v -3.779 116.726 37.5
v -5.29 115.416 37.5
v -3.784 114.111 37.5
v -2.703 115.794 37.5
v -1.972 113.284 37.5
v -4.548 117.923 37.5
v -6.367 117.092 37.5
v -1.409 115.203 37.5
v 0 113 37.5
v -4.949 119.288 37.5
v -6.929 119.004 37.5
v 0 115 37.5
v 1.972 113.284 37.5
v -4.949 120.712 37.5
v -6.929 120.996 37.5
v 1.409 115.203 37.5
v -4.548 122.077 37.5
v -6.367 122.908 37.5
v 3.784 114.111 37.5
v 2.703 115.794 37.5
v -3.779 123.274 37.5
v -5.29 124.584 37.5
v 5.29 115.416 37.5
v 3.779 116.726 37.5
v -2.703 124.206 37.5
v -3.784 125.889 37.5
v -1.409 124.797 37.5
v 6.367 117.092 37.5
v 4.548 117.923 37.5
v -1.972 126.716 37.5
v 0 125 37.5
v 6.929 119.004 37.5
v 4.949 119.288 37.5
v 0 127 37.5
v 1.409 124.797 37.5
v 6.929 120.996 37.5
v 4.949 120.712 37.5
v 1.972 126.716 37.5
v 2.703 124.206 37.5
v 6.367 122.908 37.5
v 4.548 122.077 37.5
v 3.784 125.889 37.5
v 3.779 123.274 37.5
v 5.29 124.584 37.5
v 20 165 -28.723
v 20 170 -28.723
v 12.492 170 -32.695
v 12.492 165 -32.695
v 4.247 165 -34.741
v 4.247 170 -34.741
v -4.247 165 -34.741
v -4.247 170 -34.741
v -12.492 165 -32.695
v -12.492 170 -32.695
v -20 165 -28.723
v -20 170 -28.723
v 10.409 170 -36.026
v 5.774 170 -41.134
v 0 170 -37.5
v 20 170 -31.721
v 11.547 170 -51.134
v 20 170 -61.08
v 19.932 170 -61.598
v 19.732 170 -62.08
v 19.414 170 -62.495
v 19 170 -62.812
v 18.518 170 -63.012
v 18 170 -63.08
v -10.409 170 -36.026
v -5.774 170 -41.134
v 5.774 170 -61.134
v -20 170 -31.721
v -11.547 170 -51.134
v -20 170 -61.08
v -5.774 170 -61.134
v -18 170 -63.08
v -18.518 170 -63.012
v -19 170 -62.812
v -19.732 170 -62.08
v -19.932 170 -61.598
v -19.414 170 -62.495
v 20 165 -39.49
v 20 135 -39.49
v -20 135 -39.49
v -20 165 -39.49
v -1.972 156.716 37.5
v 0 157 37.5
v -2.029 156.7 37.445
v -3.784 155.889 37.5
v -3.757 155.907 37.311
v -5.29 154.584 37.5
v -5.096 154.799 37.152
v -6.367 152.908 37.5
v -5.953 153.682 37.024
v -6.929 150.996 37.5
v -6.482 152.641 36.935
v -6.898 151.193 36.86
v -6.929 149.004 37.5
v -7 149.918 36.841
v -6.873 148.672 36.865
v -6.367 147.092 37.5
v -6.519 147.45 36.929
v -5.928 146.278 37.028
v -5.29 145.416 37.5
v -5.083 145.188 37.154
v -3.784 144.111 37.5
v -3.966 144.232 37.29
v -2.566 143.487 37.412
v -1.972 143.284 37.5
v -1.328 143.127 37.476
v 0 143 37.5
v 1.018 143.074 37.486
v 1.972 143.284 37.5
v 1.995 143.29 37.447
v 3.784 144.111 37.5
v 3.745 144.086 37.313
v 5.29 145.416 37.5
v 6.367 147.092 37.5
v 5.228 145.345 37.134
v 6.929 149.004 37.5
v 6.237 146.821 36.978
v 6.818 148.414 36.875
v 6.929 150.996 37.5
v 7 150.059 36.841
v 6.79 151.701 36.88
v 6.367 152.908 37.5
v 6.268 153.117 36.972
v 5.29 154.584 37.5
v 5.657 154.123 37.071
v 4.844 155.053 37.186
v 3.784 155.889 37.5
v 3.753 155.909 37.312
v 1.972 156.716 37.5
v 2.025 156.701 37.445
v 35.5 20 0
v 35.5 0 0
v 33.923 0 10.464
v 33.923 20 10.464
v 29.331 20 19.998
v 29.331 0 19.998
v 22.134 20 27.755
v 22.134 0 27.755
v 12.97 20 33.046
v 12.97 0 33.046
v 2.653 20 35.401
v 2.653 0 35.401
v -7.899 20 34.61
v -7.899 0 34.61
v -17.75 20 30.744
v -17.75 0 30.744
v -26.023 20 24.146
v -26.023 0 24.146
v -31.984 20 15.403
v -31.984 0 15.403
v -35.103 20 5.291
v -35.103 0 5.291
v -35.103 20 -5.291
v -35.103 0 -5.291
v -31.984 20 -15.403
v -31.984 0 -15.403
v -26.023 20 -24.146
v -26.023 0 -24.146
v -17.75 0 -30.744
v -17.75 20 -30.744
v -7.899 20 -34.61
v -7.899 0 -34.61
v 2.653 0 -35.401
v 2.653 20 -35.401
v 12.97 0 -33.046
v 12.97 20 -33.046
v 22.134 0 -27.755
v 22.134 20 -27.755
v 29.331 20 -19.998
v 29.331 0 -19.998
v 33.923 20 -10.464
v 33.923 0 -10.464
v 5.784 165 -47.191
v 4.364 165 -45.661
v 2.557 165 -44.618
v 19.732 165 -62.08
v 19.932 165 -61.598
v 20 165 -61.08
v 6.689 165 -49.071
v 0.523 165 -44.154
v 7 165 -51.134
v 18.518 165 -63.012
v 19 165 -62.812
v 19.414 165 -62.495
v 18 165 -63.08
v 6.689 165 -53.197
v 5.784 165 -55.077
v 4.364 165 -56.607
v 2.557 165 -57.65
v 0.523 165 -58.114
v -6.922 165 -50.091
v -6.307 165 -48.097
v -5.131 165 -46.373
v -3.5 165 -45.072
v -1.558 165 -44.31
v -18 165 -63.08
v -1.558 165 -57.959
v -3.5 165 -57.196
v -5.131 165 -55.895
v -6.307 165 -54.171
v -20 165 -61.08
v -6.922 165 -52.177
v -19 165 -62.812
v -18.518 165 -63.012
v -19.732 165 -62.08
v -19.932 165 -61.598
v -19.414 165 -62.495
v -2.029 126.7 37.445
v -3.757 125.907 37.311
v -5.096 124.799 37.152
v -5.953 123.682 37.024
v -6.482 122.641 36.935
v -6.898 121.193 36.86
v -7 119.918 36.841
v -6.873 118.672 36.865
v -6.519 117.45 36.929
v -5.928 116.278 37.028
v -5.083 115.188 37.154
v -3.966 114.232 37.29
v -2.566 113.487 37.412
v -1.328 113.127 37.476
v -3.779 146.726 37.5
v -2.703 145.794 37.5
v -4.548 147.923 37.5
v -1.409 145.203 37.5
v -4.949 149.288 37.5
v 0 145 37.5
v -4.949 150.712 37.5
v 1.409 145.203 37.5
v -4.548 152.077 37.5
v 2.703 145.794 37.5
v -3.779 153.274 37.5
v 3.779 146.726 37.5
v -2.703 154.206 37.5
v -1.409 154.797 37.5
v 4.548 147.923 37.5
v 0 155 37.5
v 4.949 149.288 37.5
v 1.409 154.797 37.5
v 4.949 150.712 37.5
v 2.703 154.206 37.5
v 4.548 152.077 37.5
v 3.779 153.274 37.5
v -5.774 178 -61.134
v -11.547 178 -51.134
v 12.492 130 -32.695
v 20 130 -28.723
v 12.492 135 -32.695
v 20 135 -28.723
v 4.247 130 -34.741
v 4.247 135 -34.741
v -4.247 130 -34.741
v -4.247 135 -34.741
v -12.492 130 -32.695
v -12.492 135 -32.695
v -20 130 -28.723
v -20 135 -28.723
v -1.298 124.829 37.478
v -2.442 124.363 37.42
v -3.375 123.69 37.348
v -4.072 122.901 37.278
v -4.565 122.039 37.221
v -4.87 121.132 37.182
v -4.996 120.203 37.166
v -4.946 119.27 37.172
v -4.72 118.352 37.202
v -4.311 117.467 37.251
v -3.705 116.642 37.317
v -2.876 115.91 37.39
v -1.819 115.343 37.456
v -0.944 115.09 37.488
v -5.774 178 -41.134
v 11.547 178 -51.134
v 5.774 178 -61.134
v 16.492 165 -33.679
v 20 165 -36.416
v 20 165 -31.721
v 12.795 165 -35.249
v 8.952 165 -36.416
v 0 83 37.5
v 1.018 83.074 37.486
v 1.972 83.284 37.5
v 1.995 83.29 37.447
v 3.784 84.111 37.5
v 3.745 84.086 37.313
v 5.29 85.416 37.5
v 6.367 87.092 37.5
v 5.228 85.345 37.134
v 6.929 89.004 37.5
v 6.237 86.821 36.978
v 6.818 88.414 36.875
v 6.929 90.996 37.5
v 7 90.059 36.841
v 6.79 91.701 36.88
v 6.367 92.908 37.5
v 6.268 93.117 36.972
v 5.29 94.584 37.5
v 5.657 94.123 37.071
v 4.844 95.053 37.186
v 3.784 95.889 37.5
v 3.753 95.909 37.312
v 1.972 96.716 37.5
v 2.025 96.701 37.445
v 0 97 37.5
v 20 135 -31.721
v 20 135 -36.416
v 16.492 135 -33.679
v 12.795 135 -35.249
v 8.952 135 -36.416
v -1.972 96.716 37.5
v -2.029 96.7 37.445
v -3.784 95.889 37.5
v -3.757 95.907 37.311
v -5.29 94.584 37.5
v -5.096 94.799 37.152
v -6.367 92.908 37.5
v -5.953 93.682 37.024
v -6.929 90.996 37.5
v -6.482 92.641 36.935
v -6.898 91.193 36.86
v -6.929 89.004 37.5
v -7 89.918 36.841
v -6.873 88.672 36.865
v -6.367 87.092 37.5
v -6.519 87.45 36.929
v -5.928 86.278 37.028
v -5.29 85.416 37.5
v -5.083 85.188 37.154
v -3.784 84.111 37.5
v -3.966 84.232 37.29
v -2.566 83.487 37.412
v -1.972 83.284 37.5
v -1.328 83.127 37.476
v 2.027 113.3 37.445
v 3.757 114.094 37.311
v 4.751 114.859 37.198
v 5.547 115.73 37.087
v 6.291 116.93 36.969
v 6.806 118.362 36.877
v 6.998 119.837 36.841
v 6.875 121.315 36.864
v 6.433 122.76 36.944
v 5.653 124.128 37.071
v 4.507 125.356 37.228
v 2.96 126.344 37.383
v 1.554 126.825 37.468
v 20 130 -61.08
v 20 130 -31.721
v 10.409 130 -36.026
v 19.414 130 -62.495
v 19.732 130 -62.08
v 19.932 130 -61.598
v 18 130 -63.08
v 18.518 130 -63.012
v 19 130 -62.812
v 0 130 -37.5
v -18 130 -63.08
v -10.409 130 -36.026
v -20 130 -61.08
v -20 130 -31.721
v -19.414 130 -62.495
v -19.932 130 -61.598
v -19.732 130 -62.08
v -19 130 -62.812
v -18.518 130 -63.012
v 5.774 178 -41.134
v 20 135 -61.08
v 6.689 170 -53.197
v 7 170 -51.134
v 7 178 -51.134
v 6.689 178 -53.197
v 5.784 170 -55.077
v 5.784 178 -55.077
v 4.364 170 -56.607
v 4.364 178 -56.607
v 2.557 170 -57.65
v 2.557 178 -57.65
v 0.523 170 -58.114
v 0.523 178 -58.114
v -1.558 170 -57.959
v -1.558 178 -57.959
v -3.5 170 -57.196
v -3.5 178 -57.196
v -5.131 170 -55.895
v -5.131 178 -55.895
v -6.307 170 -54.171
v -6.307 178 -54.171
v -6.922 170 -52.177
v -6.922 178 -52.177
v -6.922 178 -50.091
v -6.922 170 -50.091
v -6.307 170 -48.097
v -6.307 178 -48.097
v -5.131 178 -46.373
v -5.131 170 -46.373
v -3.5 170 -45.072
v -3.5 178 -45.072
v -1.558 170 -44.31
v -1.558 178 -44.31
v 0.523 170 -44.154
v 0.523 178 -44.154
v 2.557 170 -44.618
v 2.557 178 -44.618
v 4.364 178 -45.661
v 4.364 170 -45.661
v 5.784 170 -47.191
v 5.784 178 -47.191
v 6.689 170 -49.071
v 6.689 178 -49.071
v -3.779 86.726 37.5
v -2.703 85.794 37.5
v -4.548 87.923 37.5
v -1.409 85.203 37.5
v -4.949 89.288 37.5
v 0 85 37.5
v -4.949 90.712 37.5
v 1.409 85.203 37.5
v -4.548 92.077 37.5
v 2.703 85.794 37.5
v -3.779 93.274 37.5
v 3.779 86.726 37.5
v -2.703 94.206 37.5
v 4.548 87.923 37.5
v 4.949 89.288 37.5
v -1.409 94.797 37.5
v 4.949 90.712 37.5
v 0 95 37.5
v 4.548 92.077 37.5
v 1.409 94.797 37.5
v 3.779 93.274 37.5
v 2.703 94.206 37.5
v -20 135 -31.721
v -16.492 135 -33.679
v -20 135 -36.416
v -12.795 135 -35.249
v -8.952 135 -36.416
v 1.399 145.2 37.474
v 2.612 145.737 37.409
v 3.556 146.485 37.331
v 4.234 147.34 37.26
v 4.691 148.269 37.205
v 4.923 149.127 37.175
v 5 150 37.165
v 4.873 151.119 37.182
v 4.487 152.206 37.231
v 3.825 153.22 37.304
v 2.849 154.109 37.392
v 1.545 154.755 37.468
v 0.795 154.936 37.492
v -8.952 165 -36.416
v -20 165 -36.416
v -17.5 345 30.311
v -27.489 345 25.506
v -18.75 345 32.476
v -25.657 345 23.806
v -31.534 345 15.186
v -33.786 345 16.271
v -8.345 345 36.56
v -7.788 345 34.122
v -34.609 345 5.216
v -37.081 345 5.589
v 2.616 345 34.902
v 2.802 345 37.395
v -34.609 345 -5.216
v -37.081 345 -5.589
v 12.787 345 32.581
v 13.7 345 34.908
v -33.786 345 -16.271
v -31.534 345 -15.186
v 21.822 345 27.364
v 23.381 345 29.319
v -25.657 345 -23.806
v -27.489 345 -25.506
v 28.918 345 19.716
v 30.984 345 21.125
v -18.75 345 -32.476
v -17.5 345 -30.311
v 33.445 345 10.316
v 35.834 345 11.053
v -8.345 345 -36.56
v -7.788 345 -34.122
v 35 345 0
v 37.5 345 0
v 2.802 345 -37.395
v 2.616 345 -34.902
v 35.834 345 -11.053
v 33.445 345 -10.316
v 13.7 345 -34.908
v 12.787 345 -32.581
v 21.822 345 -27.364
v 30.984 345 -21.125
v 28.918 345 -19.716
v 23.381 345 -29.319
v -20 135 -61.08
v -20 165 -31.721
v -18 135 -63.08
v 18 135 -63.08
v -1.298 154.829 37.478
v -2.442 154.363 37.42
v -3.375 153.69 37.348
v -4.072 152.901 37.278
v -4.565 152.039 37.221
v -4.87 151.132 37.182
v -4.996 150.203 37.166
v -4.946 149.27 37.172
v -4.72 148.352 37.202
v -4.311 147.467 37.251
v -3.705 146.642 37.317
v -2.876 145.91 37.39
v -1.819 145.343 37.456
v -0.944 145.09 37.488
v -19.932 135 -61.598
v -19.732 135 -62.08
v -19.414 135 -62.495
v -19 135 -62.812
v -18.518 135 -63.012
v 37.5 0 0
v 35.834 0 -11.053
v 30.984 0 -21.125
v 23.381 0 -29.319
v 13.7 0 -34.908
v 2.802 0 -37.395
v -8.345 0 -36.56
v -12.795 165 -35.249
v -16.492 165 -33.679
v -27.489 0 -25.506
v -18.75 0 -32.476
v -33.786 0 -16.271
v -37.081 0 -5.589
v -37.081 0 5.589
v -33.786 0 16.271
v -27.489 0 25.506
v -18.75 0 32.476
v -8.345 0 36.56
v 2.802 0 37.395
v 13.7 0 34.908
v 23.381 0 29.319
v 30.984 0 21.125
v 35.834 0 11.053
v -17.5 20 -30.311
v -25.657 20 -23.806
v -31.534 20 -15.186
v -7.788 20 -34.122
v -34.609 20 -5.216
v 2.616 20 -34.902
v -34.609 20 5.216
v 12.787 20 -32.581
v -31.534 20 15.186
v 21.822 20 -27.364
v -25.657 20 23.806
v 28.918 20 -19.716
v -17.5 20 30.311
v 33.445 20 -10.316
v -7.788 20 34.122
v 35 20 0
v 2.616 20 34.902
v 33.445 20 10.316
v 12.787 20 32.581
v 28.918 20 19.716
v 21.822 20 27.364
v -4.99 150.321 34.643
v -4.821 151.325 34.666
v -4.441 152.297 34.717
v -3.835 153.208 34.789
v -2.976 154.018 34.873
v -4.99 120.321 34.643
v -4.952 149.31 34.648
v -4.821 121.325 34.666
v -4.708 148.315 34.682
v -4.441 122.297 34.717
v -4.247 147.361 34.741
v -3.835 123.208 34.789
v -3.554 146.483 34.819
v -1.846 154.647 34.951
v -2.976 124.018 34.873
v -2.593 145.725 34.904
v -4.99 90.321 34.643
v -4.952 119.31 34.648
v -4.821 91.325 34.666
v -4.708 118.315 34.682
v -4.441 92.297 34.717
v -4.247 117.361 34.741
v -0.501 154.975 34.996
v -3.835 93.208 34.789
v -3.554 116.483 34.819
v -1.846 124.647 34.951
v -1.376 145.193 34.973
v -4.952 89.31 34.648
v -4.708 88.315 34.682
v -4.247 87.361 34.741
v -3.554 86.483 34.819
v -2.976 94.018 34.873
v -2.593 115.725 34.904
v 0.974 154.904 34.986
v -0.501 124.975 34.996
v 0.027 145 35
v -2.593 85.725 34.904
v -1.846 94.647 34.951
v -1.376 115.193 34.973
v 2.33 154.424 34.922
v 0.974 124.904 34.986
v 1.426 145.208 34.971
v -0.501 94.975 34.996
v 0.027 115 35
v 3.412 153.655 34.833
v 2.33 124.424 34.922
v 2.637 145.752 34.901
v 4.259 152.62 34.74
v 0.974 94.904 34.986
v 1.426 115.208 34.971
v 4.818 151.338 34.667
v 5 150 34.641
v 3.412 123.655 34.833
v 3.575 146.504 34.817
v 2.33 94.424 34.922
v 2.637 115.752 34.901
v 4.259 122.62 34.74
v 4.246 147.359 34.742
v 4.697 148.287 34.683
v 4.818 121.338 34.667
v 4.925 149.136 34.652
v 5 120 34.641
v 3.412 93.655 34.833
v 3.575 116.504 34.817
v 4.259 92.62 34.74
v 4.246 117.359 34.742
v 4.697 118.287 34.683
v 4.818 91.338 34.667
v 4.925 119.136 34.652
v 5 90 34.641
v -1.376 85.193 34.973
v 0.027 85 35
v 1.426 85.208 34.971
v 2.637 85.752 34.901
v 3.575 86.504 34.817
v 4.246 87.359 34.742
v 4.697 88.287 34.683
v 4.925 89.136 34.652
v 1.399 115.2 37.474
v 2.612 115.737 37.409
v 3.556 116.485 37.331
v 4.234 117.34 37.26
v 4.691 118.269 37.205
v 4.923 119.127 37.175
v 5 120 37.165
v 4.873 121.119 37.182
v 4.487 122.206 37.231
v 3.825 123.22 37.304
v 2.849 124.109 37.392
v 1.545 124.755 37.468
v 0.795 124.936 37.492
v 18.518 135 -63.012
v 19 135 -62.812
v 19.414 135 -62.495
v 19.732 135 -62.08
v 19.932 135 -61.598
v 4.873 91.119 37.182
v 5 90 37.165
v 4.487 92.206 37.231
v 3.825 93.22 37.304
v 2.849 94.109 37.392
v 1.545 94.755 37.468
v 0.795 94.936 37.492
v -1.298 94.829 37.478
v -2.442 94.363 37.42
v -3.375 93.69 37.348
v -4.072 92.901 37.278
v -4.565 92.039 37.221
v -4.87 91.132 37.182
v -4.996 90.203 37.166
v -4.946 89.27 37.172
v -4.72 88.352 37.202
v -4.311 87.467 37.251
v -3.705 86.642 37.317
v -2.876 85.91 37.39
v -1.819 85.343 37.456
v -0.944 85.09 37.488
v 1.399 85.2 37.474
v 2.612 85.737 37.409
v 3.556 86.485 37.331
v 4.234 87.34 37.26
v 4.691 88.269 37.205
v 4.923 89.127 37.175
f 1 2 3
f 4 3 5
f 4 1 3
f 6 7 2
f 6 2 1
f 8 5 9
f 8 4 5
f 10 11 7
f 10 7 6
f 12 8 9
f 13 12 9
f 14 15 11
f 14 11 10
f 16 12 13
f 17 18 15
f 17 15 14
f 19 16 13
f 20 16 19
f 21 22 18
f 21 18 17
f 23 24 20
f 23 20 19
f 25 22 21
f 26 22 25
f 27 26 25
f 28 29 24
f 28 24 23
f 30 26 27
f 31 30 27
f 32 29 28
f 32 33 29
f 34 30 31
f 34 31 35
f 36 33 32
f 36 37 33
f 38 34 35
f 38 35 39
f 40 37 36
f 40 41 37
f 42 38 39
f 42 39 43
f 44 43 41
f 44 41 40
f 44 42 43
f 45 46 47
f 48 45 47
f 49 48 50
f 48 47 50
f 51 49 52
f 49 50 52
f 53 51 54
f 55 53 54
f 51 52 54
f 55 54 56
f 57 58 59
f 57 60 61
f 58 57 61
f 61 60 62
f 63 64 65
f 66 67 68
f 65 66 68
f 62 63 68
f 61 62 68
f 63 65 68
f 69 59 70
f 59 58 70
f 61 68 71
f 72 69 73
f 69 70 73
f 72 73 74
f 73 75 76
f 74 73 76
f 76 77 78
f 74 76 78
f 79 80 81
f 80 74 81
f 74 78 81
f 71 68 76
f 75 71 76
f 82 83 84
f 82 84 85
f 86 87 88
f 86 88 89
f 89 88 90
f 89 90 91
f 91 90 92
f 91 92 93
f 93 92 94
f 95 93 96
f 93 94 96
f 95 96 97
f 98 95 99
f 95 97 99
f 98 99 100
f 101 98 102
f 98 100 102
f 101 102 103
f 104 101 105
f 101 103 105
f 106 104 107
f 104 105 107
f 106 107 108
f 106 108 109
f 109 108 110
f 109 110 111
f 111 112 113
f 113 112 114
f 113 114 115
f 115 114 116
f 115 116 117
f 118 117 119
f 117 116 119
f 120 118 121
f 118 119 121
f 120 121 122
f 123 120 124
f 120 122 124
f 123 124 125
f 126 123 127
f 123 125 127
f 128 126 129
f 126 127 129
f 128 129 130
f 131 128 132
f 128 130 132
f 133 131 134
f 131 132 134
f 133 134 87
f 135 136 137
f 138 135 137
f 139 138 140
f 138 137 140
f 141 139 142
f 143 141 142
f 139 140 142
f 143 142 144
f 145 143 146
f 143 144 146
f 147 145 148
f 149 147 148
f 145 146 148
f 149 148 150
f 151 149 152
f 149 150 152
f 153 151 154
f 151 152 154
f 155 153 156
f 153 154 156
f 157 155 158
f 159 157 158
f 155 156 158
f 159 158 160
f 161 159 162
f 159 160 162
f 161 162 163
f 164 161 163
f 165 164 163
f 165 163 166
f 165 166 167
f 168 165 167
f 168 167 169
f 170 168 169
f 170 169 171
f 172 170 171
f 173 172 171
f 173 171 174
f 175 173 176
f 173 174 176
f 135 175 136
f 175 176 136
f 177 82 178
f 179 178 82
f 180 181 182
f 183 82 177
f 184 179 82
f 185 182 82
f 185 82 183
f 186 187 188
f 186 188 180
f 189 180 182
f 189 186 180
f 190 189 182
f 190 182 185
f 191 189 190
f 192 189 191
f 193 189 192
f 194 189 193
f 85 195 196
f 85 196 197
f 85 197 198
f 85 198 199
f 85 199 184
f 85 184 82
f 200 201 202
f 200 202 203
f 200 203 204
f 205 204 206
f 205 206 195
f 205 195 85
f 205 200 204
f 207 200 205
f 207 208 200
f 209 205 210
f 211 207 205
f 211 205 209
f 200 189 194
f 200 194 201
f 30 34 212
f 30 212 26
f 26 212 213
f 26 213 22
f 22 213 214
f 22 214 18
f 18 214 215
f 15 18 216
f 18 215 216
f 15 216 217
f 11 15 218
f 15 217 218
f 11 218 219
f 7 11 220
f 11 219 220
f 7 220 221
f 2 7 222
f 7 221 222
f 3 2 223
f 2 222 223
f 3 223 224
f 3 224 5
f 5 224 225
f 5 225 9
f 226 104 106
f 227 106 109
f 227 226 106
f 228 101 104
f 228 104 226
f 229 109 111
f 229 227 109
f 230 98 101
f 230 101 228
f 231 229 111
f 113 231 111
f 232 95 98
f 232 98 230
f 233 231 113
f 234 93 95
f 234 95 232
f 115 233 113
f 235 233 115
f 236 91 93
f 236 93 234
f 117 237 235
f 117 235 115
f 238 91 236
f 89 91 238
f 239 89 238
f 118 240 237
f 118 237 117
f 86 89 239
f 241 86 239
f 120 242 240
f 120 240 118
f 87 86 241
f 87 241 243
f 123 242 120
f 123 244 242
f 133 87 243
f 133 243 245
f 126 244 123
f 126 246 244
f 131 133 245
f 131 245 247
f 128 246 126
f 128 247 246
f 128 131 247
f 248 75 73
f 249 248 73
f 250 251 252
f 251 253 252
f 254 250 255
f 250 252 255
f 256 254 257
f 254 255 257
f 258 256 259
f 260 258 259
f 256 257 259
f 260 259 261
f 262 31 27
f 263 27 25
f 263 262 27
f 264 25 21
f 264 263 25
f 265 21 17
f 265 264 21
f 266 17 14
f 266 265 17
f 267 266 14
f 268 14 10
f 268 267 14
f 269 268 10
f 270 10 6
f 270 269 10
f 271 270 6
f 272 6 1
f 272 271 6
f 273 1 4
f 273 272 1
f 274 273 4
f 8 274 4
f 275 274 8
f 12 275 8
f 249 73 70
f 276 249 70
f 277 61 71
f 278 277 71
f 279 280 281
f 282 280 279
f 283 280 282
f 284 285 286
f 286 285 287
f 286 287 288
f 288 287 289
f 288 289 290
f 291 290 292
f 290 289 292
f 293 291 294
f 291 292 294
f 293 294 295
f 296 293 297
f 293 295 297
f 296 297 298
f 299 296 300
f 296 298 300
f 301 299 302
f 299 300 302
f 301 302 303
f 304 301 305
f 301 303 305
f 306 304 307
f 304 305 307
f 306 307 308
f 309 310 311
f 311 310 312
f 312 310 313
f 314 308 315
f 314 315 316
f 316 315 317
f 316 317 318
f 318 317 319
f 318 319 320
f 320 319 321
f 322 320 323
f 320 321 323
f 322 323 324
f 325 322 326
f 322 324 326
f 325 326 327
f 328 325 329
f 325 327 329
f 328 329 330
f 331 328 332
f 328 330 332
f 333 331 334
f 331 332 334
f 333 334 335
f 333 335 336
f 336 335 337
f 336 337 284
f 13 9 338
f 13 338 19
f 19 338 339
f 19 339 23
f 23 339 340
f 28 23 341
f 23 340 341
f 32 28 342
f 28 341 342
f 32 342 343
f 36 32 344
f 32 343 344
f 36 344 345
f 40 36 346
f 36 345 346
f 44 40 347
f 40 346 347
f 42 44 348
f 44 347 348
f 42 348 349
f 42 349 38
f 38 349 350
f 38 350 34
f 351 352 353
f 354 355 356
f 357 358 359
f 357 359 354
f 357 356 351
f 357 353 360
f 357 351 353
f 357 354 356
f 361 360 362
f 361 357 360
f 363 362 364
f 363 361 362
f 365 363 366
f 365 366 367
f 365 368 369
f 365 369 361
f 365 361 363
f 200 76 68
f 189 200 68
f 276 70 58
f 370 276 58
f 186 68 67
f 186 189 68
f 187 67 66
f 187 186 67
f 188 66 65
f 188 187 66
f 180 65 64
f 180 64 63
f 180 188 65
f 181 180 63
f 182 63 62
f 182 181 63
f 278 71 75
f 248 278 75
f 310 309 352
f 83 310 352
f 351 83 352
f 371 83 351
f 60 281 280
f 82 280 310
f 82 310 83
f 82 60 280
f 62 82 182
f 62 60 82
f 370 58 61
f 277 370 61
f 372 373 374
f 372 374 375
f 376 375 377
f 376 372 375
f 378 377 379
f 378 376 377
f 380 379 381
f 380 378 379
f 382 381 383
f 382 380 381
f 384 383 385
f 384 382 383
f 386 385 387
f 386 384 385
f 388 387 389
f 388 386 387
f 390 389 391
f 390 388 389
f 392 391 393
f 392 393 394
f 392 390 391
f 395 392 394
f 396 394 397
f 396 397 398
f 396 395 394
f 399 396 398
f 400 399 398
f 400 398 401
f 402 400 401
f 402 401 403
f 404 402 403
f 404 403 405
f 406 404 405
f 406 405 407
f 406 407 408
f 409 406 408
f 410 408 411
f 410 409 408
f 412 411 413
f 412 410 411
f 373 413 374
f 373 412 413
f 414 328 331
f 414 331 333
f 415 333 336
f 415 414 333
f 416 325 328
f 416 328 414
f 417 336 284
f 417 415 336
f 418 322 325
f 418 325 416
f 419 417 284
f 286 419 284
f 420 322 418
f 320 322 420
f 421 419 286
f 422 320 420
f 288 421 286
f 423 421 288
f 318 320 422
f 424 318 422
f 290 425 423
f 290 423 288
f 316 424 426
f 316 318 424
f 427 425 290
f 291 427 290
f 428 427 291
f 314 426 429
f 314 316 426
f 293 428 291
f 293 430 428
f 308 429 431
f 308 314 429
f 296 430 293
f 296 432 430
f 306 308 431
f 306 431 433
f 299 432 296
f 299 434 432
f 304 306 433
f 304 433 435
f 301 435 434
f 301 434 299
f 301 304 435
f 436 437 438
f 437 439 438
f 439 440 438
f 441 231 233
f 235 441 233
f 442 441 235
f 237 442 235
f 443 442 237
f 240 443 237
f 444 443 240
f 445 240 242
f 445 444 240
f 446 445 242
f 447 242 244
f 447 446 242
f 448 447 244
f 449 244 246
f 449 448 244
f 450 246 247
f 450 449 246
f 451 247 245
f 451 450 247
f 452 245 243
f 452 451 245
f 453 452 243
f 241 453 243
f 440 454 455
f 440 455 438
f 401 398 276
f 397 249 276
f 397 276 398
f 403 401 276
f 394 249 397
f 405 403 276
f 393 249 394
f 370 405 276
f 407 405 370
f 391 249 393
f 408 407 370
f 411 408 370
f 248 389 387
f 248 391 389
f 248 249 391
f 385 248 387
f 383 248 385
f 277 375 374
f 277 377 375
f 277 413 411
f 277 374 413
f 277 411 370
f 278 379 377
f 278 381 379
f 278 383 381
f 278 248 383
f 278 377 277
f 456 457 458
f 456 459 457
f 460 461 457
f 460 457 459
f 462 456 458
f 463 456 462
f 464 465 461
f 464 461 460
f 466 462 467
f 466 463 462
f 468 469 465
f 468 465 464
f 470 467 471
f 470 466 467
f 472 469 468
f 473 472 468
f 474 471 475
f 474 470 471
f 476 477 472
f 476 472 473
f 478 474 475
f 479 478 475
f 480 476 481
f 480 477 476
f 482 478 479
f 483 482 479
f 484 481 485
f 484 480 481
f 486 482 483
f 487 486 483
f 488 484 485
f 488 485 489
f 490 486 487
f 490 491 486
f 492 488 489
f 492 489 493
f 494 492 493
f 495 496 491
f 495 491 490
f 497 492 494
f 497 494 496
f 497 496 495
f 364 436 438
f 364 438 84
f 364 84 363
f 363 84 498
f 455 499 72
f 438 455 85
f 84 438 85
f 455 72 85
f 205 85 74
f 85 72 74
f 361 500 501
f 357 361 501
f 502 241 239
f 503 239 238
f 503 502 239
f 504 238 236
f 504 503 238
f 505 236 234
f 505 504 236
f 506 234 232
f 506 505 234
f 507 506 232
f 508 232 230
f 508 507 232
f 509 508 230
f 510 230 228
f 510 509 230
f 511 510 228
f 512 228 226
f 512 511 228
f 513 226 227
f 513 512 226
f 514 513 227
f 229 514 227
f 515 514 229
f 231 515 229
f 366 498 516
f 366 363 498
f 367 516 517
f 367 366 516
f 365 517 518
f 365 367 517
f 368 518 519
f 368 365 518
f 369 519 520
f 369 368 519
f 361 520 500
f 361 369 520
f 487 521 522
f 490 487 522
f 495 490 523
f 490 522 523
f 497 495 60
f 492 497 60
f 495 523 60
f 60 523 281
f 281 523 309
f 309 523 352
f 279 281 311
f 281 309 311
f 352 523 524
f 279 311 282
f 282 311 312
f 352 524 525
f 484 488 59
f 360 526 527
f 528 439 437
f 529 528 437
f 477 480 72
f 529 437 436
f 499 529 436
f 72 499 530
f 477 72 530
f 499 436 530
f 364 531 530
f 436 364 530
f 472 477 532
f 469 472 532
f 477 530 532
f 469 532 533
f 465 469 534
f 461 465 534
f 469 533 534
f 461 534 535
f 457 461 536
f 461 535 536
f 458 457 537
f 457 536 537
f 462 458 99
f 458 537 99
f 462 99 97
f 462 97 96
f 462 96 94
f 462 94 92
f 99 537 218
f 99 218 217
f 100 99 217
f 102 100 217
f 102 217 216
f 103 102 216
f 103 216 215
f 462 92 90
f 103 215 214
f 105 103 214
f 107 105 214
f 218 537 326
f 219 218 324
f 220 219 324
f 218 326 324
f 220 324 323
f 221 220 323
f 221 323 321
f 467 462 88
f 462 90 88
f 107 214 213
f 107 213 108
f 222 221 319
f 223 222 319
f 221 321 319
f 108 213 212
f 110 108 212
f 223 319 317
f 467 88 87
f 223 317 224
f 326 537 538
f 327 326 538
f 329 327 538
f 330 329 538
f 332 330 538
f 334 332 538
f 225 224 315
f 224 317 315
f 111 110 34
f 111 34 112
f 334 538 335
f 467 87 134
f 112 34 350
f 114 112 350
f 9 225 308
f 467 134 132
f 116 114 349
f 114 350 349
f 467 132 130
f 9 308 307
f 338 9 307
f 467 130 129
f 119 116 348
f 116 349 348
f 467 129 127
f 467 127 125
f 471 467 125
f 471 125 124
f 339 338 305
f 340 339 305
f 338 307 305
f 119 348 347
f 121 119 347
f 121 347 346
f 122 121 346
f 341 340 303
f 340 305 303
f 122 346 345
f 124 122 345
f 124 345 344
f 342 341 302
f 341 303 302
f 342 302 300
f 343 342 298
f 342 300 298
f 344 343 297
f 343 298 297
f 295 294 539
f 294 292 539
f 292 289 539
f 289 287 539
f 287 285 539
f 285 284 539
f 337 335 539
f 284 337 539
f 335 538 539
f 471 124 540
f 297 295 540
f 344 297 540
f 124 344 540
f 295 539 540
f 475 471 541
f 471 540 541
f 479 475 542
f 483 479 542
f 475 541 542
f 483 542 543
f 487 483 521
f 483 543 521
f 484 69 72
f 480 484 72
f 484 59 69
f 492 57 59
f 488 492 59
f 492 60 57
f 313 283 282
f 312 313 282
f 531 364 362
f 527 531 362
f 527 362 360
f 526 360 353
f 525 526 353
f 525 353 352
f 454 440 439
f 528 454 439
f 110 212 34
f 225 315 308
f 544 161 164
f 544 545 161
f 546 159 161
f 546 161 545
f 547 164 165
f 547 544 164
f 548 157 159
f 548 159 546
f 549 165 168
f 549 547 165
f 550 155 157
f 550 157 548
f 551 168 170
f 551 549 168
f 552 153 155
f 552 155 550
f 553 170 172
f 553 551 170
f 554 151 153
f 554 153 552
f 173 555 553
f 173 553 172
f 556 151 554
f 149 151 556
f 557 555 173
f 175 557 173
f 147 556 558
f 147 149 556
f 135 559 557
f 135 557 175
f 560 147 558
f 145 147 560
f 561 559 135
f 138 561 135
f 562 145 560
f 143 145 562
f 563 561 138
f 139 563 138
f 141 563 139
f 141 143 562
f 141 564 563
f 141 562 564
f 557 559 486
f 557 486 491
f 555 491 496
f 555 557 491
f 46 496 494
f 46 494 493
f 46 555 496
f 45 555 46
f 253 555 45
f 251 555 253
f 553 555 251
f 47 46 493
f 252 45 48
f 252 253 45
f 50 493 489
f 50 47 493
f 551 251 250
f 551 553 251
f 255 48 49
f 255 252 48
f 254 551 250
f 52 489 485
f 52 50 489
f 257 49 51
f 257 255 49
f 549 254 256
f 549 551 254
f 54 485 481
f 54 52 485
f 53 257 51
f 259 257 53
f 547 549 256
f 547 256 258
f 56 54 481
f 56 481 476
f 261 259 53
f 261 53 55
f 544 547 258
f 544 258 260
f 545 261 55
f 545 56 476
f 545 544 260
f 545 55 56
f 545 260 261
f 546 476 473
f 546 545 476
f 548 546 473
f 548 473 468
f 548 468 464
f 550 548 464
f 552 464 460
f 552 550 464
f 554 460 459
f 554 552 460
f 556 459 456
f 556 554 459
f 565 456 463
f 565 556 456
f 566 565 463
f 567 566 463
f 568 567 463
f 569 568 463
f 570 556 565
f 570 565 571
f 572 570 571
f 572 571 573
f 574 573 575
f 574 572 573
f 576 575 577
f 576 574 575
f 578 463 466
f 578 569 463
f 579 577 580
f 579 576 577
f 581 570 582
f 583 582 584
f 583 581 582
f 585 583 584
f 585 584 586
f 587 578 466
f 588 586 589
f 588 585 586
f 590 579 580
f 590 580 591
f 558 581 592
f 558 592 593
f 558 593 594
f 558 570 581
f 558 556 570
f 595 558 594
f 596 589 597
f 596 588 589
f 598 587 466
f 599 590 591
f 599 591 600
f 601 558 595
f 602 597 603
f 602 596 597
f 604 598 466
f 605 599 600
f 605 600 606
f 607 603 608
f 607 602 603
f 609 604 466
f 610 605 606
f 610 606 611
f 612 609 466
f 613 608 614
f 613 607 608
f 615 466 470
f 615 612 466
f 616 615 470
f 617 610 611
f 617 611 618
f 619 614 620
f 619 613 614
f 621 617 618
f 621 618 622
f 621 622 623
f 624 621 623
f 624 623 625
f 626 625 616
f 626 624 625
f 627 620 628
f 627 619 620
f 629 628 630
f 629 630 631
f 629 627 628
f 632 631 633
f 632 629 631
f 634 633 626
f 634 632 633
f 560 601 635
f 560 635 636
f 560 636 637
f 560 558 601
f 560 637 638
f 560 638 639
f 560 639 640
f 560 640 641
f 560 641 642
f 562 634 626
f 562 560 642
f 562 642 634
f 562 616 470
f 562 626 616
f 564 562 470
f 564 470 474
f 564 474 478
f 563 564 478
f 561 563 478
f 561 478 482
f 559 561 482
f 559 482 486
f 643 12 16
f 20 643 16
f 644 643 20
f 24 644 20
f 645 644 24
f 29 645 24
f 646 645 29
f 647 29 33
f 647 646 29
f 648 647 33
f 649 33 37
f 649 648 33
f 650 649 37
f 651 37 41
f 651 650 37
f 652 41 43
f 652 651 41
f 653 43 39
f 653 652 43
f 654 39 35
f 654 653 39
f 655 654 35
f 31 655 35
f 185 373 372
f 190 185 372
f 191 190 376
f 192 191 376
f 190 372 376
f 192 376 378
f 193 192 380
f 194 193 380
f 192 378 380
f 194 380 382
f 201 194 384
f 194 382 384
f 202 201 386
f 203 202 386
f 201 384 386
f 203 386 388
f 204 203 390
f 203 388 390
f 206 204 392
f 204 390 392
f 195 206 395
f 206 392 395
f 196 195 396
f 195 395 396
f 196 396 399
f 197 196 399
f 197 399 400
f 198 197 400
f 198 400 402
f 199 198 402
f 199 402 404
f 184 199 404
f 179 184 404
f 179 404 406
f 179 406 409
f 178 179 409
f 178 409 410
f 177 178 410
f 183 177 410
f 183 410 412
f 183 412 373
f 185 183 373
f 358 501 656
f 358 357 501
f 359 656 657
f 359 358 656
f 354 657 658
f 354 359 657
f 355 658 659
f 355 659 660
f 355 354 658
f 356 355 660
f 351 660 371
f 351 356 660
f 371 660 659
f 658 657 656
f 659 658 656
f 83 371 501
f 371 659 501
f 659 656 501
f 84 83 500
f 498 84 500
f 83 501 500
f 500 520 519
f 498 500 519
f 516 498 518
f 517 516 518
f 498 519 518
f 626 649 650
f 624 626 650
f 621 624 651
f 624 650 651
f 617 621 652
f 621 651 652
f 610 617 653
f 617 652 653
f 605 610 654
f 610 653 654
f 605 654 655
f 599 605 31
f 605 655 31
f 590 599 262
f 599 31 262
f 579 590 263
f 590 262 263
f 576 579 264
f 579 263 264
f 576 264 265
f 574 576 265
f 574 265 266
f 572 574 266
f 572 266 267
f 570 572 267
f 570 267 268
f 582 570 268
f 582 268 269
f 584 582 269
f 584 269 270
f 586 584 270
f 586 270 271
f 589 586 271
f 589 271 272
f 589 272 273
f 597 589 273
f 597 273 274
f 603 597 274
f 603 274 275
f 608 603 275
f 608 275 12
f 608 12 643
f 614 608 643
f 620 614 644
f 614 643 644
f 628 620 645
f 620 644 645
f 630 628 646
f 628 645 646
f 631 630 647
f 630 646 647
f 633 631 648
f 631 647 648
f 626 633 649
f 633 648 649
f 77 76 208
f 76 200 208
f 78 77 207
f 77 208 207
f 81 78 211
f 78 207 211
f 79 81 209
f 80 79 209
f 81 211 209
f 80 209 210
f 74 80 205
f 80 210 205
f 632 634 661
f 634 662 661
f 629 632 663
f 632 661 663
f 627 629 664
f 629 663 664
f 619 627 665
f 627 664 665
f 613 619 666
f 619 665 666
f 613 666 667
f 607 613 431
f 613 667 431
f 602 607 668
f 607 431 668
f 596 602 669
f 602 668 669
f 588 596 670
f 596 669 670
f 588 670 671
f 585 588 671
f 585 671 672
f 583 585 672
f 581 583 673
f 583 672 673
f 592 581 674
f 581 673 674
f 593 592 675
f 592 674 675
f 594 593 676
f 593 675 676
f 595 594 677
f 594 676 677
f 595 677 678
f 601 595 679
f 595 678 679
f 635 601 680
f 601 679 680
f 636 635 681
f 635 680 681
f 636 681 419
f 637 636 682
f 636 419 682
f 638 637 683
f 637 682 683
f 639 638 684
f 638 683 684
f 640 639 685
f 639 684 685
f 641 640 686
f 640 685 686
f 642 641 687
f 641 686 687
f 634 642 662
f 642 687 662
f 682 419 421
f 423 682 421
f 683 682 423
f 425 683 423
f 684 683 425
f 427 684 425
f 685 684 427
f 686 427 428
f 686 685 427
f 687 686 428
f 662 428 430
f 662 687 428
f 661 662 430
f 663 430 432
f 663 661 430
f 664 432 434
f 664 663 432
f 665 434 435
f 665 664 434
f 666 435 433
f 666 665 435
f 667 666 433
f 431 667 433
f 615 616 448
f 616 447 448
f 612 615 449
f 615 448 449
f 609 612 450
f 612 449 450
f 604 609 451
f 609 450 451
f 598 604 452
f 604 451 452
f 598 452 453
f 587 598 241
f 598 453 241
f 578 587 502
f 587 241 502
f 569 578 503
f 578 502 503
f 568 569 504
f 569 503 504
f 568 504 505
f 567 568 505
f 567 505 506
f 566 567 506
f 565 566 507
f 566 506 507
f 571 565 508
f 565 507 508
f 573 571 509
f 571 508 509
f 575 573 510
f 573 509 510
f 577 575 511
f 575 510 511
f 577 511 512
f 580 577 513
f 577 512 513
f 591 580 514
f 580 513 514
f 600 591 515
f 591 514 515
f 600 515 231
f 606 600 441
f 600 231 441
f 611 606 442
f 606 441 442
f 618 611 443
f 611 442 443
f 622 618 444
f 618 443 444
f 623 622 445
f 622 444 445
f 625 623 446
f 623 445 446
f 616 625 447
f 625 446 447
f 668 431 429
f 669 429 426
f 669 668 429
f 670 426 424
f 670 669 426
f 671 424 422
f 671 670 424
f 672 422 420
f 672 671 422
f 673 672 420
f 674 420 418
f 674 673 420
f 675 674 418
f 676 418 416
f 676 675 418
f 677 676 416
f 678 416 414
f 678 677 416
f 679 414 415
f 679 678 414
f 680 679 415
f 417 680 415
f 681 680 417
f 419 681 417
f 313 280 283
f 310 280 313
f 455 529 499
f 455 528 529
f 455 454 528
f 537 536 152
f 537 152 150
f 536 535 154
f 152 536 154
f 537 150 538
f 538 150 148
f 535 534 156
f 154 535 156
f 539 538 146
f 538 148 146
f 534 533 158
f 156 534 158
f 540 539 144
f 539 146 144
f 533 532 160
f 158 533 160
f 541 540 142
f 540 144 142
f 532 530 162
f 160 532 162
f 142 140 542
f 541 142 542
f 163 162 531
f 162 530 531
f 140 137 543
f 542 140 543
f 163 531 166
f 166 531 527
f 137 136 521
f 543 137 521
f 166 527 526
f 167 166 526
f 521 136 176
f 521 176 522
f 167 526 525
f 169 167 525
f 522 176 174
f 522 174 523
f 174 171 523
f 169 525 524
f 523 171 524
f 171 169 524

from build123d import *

# Parameters (mm, degrees)
SKETCH1_R                  = 37.5
SKETCH1_R_2                = 35
BOSS_EXTRUDE1_DEPTH        = 345
SKETCH2_R                  = 35.5
SKETCH2_R_2                = 33.5
CUT_EXTRUDE1_DEPTH         = 20
SKETCH3_R                  = 5
CUT_EXTRUDE2_DEPTH         = 10
CUT_EXTRUDE2_DEPTH_BACK    = 30
SKETCH5_R                  = 7
SKETCH5_R_2                = 5
BOSS_EXTRUDE3_DEPTH        = 1
BOSS_EXTRUDE3_2_DEPTH      = 1
SKETCH6_R                  = 7
SKETCH6_R_2                = 5
BOSS_EXTRUDE5_DEPTH        = 1
BOSS_EXTRUDE7_DEPTH        = 50
BOSS_EXTRUDE7_DEPTH_BACK   = 10
BOSS_EXTRUDE7_2_DEPTH      = 50
BOSS_EXTRUDE7_2_DEPTH_BACK = 10
SKETCH13_R                 = 7
SKETCH13_W                 = 40
SKETCH13_H                 = 24.419709383
CUT_EXTRUDE7_DEPTH         = 21
SKETCH14_R                 = 35
CUT_EXTRUDE8_DEPTH         = 346.0000001
SKETCH15_R                 = 7
BOSS_EXTRUDE8_DEPTH        = 8
SKETCH16_W                 = 40
SKETCH16_H                 = 24.419709383
CUT_EXTRUDE11_DEPTH        = 97
FILLET1_R                  = 2
FILLET2_R                  = 2
BOSS_EXTRUDE12_DEPTH       = 40


with BuildPart() as part:
    # Sketch1 → Boss-Extrude1 (new body)
    with BuildSketch(Plane(origin=(0, 0, 0), x_dir=(1, 0, 0), z_dir=(0, 1, 0))):
        Circle(SKETCH1_R)
        Circle(SKETCH1_R_2, mode=Mode.SUBTRACT)
    extrude(amount=BOSS_EXTRUDE1_DEPTH)

    # Sketch2 → Cut-Extrude1 (cut)
    with BuildSketch(Plane.XZ):
        Circle(SKETCH2_R)
        Circle(SKETCH2_R_2, mode=Mode.SUBTRACT)
    extrude(amount=-CUT_EXTRUDE1_DEPTH, mode=Mode.SUBTRACT)

    # Sketch3 → Cut-Extrude2 (cut, two sides)
    with BuildSketch(Plane.XY.offset(36.5)) as cut_extrude2_sk:
        with Locations((0, 120)):
            Circle(SKETCH3_R)
        with Locations((0, 90)):
            Circle(SKETCH3_R)
        with Locations((0, 150)):
            Circle(SKETCH3_R)
    extrude(amount=CUT_EXTRUDE2_DEPTH, mode=Mode.SUBTRACT)
    extrude(cut_extrude2_sk.sketch, amount=-CUT_EXTRUDE2_DEPTH_BACK, mode=Mode.SUBTRACT)



with BuildPart() as body_2:
    # Sketch5 → Boss-Extrude3 (new body)
    with BuildSketch(Plane.XY.offset(36.5)):
        with Locations((0, 120)):
            Circle(SKETCH5_R)
        with Locations((0, 120)):
            Circle(SKETCH5_R_2, mode=Mode.SUBTRACT)
    extrude(amount=-BOSS_EXTRUDE3_DEPTH)


with BuildPart() as body_3:
    # Sketch5 → Boss-Extrude3 2 (new body)
    with BuildSketch(Plane.XY.offset(36.5)):
        with Locations((0, 90)):
            Circle(SKETCH5_R)
        with Locations((0, 90)):
            Circle(SKETCH5_R_2, mode=Mode.SUBTRACT)
    extrude(amount=-BOSS_EXTRUDE3_2_DEPTH)


with BuildPart() as part_1:
    add(part.part)

    add(body_2.part)  # Boss-Extrude5 merges body 2

    add(body_3.part)  # Boss-Extrude5 merges body 3
    # Sketch6 → Boss-Extrude5 (add)
    with BuildSketch(Plane.XY.offset(36.5)):
        with Locations((0, 120)):
            Circle(SKETCH6_R)
        with Locations((0, 120)):
            Circle(SKETCH6_R_2, mode=Mode.SUBTRACT)
        with Locations((0, 150)):
            Circle(SKETCH6_R)
        with Locations((0, 150)):
            Circle(SKETCH6_R_2, mode=Mode.SUBTRACT)
        with Locations((0, 90)):
            Circle(SKETCH6_R)
        with Locations((0, 90)):
            Circle(SKETCH6_R_2, mode=Mode.SUBTRACT)
    extrude(amount=BOSS_EXTRUDE5_DEPTH)



with BuildPart() as body_2_2:
    # Sketch12 → Boss-Extrude7 (new body, two sides)
    with BuildSketch(Plane(origin=(0, 0, -37.5), x_dir=(-1, 0, 0), z_dir=(0, 0, -1))) as boss_extrude7_sk:
        Polygon((20, 165), (0, 165), (-20, 165), (-20, 170), (20, 170), align=None)
    extrude(amount=BOSS_EXTRUDE7_DEPTH)
    extrude(boss_extrude7_sk.sketch, amount=-BOSS_EXTRUDE7_DEPTH_BACK)

    # Sketch13 → Cut-Extrude7 (cut)
    with BuildSketch(Plane(origin=(0, 170, 0), x_dir=(1, 0, 0), z_dir=(0, 1, 0))):
        with Locations((0, 51.13401188)):
            Circle(SKETCH13_R)
        with Locations((0, 75.290145309)):
            Rectangle(SKETCH13_W, SKETCH13_H)
    extrude(amount=-CUT_EXTRUDE7_DEPTH, mode=Mode.SUBTRACT)


with BuildPart() as body_3_2:
    # Sketch12 → Boss-Extrude7 2 (new body, two sides)
    with BuildSketch(Plane(origin=(0, 0, -37.5), x_dir=(-1, 0, 0), z_dir=(0, 0, -1))) as boss_extrude7_2_sk:
        Polygon((20, 135), (20, 130), (0, 130), (-20, 130), (-20, 135), align=None)
    extrude(amount=BOSS_EXTRUDE7_2_DEPTH)
    extrude(boss_extrude7_2_sk.sketch, amount=-BOSS_EXTRUDE7_2_DEPTH_BACK)


with BuildPart() as cut_extrude8_tool:
    # Sketch14 → Cut-Extrude8 (new body, through all)
    with BuildSketch(Plane(origin=(0, 345, 0), x_dir=(1, 0, 0), z_dir=(0, 1, 0))):
        Circle(SKETCH14_R)
    extrude(amount=-CUT_EXTRUDE8_DEPTH)


with BuildPart() as body_2_2_1:
    add(body_2_2.part)

    # Cut-Extrude8: cut by cut_extrude8_tool
    add(cut_extrude8_tool.part, mode=Mode.SUBTRACT)

    # Sketch15 → Boss-Extrude8 (add)
    with BuildSketch(Plane(origin=(0, 170, 0), x_dir=(1, 0, 0), z_dir=(0, 1, 0))):
        Polygon((11.547005384, 51.13401188), (5.773502692, 61.13401188), (-5.773502692, 61.13401188), (-11.547005384, 51.13401188), (-5.773502692, 41.13401188), (5.773502692, 41.13401188), align=None)
        with Locations((0, 51.13401188)):
            Circle(SKETCH15_R, mode=Mode.SUBTRACT)
    extrude(amount=BOSS_EXTRUDE8_DEPTH)

    # Fillet1
    fillet1_edges = [body_2_2_1.edges().sort_by_distance(p)[0] for p in [
        (20, 167.5, -63.080290617),
        (-20, 167.5, -63.080290617),
    ]]
    fillet(fillet1_edges, radius=FILLET1_R)


with BuildPart() as body_3_2_1:
    add(body_3_2.part)

    # Cut-Extrude8: cut by cut_extrude8_tool
    add(cut_extrude8_tool.part, mode=Mode.SUBTRACT)

    # Sketch16 → Cut-Extrude11 (cut)
    with BuildSketch(Plane(origin=(0, 170, 0), x_dir=(1, 0, 0), z_dir=(0, 1, 0))):
        with Locations((0, 75.290145309)):
            Rectangle(SKETCH16_W, SKETCH16_H)
    extrude(amount=-CUT_EXTRUDE11_DEPTH, mode=Mode.SUBTRACT)

    # Fillet2
    fillet2_edges = [body_3_2_1.edges().sort_by_distance(p)[0] for p in [
        (20, 132.5, -63.080290617),
        (-20, 132.5, -63.080290617),
    ]]
    fillet(fillet2_edges, radius=FILLET2_R)


with BuildPart() as part_2:
    add(part_1.part)

    add(body_2_2_1.part)  # Boss-Extrude12 merges body 2 2

    add(body_3_2_1.part)  # Boss-Extrude12 merges body 3 2
    # Sketch18 → Boss-Extrude12 (add)
    with BuildSketch(Plane(origin=(20, 0, 0), x_dir=(0, 0, -1), z_dir=(1, 0, 0))):
        Polygon((39.490080652, 165), (37.410474121, 165), (36.415879692, 165), (36.415879692, 135), (39.490080652, 135), align=None)
    extrude(amount=-BOSS_EXTRUDE12_DEPTH)


solid = part_2.part
